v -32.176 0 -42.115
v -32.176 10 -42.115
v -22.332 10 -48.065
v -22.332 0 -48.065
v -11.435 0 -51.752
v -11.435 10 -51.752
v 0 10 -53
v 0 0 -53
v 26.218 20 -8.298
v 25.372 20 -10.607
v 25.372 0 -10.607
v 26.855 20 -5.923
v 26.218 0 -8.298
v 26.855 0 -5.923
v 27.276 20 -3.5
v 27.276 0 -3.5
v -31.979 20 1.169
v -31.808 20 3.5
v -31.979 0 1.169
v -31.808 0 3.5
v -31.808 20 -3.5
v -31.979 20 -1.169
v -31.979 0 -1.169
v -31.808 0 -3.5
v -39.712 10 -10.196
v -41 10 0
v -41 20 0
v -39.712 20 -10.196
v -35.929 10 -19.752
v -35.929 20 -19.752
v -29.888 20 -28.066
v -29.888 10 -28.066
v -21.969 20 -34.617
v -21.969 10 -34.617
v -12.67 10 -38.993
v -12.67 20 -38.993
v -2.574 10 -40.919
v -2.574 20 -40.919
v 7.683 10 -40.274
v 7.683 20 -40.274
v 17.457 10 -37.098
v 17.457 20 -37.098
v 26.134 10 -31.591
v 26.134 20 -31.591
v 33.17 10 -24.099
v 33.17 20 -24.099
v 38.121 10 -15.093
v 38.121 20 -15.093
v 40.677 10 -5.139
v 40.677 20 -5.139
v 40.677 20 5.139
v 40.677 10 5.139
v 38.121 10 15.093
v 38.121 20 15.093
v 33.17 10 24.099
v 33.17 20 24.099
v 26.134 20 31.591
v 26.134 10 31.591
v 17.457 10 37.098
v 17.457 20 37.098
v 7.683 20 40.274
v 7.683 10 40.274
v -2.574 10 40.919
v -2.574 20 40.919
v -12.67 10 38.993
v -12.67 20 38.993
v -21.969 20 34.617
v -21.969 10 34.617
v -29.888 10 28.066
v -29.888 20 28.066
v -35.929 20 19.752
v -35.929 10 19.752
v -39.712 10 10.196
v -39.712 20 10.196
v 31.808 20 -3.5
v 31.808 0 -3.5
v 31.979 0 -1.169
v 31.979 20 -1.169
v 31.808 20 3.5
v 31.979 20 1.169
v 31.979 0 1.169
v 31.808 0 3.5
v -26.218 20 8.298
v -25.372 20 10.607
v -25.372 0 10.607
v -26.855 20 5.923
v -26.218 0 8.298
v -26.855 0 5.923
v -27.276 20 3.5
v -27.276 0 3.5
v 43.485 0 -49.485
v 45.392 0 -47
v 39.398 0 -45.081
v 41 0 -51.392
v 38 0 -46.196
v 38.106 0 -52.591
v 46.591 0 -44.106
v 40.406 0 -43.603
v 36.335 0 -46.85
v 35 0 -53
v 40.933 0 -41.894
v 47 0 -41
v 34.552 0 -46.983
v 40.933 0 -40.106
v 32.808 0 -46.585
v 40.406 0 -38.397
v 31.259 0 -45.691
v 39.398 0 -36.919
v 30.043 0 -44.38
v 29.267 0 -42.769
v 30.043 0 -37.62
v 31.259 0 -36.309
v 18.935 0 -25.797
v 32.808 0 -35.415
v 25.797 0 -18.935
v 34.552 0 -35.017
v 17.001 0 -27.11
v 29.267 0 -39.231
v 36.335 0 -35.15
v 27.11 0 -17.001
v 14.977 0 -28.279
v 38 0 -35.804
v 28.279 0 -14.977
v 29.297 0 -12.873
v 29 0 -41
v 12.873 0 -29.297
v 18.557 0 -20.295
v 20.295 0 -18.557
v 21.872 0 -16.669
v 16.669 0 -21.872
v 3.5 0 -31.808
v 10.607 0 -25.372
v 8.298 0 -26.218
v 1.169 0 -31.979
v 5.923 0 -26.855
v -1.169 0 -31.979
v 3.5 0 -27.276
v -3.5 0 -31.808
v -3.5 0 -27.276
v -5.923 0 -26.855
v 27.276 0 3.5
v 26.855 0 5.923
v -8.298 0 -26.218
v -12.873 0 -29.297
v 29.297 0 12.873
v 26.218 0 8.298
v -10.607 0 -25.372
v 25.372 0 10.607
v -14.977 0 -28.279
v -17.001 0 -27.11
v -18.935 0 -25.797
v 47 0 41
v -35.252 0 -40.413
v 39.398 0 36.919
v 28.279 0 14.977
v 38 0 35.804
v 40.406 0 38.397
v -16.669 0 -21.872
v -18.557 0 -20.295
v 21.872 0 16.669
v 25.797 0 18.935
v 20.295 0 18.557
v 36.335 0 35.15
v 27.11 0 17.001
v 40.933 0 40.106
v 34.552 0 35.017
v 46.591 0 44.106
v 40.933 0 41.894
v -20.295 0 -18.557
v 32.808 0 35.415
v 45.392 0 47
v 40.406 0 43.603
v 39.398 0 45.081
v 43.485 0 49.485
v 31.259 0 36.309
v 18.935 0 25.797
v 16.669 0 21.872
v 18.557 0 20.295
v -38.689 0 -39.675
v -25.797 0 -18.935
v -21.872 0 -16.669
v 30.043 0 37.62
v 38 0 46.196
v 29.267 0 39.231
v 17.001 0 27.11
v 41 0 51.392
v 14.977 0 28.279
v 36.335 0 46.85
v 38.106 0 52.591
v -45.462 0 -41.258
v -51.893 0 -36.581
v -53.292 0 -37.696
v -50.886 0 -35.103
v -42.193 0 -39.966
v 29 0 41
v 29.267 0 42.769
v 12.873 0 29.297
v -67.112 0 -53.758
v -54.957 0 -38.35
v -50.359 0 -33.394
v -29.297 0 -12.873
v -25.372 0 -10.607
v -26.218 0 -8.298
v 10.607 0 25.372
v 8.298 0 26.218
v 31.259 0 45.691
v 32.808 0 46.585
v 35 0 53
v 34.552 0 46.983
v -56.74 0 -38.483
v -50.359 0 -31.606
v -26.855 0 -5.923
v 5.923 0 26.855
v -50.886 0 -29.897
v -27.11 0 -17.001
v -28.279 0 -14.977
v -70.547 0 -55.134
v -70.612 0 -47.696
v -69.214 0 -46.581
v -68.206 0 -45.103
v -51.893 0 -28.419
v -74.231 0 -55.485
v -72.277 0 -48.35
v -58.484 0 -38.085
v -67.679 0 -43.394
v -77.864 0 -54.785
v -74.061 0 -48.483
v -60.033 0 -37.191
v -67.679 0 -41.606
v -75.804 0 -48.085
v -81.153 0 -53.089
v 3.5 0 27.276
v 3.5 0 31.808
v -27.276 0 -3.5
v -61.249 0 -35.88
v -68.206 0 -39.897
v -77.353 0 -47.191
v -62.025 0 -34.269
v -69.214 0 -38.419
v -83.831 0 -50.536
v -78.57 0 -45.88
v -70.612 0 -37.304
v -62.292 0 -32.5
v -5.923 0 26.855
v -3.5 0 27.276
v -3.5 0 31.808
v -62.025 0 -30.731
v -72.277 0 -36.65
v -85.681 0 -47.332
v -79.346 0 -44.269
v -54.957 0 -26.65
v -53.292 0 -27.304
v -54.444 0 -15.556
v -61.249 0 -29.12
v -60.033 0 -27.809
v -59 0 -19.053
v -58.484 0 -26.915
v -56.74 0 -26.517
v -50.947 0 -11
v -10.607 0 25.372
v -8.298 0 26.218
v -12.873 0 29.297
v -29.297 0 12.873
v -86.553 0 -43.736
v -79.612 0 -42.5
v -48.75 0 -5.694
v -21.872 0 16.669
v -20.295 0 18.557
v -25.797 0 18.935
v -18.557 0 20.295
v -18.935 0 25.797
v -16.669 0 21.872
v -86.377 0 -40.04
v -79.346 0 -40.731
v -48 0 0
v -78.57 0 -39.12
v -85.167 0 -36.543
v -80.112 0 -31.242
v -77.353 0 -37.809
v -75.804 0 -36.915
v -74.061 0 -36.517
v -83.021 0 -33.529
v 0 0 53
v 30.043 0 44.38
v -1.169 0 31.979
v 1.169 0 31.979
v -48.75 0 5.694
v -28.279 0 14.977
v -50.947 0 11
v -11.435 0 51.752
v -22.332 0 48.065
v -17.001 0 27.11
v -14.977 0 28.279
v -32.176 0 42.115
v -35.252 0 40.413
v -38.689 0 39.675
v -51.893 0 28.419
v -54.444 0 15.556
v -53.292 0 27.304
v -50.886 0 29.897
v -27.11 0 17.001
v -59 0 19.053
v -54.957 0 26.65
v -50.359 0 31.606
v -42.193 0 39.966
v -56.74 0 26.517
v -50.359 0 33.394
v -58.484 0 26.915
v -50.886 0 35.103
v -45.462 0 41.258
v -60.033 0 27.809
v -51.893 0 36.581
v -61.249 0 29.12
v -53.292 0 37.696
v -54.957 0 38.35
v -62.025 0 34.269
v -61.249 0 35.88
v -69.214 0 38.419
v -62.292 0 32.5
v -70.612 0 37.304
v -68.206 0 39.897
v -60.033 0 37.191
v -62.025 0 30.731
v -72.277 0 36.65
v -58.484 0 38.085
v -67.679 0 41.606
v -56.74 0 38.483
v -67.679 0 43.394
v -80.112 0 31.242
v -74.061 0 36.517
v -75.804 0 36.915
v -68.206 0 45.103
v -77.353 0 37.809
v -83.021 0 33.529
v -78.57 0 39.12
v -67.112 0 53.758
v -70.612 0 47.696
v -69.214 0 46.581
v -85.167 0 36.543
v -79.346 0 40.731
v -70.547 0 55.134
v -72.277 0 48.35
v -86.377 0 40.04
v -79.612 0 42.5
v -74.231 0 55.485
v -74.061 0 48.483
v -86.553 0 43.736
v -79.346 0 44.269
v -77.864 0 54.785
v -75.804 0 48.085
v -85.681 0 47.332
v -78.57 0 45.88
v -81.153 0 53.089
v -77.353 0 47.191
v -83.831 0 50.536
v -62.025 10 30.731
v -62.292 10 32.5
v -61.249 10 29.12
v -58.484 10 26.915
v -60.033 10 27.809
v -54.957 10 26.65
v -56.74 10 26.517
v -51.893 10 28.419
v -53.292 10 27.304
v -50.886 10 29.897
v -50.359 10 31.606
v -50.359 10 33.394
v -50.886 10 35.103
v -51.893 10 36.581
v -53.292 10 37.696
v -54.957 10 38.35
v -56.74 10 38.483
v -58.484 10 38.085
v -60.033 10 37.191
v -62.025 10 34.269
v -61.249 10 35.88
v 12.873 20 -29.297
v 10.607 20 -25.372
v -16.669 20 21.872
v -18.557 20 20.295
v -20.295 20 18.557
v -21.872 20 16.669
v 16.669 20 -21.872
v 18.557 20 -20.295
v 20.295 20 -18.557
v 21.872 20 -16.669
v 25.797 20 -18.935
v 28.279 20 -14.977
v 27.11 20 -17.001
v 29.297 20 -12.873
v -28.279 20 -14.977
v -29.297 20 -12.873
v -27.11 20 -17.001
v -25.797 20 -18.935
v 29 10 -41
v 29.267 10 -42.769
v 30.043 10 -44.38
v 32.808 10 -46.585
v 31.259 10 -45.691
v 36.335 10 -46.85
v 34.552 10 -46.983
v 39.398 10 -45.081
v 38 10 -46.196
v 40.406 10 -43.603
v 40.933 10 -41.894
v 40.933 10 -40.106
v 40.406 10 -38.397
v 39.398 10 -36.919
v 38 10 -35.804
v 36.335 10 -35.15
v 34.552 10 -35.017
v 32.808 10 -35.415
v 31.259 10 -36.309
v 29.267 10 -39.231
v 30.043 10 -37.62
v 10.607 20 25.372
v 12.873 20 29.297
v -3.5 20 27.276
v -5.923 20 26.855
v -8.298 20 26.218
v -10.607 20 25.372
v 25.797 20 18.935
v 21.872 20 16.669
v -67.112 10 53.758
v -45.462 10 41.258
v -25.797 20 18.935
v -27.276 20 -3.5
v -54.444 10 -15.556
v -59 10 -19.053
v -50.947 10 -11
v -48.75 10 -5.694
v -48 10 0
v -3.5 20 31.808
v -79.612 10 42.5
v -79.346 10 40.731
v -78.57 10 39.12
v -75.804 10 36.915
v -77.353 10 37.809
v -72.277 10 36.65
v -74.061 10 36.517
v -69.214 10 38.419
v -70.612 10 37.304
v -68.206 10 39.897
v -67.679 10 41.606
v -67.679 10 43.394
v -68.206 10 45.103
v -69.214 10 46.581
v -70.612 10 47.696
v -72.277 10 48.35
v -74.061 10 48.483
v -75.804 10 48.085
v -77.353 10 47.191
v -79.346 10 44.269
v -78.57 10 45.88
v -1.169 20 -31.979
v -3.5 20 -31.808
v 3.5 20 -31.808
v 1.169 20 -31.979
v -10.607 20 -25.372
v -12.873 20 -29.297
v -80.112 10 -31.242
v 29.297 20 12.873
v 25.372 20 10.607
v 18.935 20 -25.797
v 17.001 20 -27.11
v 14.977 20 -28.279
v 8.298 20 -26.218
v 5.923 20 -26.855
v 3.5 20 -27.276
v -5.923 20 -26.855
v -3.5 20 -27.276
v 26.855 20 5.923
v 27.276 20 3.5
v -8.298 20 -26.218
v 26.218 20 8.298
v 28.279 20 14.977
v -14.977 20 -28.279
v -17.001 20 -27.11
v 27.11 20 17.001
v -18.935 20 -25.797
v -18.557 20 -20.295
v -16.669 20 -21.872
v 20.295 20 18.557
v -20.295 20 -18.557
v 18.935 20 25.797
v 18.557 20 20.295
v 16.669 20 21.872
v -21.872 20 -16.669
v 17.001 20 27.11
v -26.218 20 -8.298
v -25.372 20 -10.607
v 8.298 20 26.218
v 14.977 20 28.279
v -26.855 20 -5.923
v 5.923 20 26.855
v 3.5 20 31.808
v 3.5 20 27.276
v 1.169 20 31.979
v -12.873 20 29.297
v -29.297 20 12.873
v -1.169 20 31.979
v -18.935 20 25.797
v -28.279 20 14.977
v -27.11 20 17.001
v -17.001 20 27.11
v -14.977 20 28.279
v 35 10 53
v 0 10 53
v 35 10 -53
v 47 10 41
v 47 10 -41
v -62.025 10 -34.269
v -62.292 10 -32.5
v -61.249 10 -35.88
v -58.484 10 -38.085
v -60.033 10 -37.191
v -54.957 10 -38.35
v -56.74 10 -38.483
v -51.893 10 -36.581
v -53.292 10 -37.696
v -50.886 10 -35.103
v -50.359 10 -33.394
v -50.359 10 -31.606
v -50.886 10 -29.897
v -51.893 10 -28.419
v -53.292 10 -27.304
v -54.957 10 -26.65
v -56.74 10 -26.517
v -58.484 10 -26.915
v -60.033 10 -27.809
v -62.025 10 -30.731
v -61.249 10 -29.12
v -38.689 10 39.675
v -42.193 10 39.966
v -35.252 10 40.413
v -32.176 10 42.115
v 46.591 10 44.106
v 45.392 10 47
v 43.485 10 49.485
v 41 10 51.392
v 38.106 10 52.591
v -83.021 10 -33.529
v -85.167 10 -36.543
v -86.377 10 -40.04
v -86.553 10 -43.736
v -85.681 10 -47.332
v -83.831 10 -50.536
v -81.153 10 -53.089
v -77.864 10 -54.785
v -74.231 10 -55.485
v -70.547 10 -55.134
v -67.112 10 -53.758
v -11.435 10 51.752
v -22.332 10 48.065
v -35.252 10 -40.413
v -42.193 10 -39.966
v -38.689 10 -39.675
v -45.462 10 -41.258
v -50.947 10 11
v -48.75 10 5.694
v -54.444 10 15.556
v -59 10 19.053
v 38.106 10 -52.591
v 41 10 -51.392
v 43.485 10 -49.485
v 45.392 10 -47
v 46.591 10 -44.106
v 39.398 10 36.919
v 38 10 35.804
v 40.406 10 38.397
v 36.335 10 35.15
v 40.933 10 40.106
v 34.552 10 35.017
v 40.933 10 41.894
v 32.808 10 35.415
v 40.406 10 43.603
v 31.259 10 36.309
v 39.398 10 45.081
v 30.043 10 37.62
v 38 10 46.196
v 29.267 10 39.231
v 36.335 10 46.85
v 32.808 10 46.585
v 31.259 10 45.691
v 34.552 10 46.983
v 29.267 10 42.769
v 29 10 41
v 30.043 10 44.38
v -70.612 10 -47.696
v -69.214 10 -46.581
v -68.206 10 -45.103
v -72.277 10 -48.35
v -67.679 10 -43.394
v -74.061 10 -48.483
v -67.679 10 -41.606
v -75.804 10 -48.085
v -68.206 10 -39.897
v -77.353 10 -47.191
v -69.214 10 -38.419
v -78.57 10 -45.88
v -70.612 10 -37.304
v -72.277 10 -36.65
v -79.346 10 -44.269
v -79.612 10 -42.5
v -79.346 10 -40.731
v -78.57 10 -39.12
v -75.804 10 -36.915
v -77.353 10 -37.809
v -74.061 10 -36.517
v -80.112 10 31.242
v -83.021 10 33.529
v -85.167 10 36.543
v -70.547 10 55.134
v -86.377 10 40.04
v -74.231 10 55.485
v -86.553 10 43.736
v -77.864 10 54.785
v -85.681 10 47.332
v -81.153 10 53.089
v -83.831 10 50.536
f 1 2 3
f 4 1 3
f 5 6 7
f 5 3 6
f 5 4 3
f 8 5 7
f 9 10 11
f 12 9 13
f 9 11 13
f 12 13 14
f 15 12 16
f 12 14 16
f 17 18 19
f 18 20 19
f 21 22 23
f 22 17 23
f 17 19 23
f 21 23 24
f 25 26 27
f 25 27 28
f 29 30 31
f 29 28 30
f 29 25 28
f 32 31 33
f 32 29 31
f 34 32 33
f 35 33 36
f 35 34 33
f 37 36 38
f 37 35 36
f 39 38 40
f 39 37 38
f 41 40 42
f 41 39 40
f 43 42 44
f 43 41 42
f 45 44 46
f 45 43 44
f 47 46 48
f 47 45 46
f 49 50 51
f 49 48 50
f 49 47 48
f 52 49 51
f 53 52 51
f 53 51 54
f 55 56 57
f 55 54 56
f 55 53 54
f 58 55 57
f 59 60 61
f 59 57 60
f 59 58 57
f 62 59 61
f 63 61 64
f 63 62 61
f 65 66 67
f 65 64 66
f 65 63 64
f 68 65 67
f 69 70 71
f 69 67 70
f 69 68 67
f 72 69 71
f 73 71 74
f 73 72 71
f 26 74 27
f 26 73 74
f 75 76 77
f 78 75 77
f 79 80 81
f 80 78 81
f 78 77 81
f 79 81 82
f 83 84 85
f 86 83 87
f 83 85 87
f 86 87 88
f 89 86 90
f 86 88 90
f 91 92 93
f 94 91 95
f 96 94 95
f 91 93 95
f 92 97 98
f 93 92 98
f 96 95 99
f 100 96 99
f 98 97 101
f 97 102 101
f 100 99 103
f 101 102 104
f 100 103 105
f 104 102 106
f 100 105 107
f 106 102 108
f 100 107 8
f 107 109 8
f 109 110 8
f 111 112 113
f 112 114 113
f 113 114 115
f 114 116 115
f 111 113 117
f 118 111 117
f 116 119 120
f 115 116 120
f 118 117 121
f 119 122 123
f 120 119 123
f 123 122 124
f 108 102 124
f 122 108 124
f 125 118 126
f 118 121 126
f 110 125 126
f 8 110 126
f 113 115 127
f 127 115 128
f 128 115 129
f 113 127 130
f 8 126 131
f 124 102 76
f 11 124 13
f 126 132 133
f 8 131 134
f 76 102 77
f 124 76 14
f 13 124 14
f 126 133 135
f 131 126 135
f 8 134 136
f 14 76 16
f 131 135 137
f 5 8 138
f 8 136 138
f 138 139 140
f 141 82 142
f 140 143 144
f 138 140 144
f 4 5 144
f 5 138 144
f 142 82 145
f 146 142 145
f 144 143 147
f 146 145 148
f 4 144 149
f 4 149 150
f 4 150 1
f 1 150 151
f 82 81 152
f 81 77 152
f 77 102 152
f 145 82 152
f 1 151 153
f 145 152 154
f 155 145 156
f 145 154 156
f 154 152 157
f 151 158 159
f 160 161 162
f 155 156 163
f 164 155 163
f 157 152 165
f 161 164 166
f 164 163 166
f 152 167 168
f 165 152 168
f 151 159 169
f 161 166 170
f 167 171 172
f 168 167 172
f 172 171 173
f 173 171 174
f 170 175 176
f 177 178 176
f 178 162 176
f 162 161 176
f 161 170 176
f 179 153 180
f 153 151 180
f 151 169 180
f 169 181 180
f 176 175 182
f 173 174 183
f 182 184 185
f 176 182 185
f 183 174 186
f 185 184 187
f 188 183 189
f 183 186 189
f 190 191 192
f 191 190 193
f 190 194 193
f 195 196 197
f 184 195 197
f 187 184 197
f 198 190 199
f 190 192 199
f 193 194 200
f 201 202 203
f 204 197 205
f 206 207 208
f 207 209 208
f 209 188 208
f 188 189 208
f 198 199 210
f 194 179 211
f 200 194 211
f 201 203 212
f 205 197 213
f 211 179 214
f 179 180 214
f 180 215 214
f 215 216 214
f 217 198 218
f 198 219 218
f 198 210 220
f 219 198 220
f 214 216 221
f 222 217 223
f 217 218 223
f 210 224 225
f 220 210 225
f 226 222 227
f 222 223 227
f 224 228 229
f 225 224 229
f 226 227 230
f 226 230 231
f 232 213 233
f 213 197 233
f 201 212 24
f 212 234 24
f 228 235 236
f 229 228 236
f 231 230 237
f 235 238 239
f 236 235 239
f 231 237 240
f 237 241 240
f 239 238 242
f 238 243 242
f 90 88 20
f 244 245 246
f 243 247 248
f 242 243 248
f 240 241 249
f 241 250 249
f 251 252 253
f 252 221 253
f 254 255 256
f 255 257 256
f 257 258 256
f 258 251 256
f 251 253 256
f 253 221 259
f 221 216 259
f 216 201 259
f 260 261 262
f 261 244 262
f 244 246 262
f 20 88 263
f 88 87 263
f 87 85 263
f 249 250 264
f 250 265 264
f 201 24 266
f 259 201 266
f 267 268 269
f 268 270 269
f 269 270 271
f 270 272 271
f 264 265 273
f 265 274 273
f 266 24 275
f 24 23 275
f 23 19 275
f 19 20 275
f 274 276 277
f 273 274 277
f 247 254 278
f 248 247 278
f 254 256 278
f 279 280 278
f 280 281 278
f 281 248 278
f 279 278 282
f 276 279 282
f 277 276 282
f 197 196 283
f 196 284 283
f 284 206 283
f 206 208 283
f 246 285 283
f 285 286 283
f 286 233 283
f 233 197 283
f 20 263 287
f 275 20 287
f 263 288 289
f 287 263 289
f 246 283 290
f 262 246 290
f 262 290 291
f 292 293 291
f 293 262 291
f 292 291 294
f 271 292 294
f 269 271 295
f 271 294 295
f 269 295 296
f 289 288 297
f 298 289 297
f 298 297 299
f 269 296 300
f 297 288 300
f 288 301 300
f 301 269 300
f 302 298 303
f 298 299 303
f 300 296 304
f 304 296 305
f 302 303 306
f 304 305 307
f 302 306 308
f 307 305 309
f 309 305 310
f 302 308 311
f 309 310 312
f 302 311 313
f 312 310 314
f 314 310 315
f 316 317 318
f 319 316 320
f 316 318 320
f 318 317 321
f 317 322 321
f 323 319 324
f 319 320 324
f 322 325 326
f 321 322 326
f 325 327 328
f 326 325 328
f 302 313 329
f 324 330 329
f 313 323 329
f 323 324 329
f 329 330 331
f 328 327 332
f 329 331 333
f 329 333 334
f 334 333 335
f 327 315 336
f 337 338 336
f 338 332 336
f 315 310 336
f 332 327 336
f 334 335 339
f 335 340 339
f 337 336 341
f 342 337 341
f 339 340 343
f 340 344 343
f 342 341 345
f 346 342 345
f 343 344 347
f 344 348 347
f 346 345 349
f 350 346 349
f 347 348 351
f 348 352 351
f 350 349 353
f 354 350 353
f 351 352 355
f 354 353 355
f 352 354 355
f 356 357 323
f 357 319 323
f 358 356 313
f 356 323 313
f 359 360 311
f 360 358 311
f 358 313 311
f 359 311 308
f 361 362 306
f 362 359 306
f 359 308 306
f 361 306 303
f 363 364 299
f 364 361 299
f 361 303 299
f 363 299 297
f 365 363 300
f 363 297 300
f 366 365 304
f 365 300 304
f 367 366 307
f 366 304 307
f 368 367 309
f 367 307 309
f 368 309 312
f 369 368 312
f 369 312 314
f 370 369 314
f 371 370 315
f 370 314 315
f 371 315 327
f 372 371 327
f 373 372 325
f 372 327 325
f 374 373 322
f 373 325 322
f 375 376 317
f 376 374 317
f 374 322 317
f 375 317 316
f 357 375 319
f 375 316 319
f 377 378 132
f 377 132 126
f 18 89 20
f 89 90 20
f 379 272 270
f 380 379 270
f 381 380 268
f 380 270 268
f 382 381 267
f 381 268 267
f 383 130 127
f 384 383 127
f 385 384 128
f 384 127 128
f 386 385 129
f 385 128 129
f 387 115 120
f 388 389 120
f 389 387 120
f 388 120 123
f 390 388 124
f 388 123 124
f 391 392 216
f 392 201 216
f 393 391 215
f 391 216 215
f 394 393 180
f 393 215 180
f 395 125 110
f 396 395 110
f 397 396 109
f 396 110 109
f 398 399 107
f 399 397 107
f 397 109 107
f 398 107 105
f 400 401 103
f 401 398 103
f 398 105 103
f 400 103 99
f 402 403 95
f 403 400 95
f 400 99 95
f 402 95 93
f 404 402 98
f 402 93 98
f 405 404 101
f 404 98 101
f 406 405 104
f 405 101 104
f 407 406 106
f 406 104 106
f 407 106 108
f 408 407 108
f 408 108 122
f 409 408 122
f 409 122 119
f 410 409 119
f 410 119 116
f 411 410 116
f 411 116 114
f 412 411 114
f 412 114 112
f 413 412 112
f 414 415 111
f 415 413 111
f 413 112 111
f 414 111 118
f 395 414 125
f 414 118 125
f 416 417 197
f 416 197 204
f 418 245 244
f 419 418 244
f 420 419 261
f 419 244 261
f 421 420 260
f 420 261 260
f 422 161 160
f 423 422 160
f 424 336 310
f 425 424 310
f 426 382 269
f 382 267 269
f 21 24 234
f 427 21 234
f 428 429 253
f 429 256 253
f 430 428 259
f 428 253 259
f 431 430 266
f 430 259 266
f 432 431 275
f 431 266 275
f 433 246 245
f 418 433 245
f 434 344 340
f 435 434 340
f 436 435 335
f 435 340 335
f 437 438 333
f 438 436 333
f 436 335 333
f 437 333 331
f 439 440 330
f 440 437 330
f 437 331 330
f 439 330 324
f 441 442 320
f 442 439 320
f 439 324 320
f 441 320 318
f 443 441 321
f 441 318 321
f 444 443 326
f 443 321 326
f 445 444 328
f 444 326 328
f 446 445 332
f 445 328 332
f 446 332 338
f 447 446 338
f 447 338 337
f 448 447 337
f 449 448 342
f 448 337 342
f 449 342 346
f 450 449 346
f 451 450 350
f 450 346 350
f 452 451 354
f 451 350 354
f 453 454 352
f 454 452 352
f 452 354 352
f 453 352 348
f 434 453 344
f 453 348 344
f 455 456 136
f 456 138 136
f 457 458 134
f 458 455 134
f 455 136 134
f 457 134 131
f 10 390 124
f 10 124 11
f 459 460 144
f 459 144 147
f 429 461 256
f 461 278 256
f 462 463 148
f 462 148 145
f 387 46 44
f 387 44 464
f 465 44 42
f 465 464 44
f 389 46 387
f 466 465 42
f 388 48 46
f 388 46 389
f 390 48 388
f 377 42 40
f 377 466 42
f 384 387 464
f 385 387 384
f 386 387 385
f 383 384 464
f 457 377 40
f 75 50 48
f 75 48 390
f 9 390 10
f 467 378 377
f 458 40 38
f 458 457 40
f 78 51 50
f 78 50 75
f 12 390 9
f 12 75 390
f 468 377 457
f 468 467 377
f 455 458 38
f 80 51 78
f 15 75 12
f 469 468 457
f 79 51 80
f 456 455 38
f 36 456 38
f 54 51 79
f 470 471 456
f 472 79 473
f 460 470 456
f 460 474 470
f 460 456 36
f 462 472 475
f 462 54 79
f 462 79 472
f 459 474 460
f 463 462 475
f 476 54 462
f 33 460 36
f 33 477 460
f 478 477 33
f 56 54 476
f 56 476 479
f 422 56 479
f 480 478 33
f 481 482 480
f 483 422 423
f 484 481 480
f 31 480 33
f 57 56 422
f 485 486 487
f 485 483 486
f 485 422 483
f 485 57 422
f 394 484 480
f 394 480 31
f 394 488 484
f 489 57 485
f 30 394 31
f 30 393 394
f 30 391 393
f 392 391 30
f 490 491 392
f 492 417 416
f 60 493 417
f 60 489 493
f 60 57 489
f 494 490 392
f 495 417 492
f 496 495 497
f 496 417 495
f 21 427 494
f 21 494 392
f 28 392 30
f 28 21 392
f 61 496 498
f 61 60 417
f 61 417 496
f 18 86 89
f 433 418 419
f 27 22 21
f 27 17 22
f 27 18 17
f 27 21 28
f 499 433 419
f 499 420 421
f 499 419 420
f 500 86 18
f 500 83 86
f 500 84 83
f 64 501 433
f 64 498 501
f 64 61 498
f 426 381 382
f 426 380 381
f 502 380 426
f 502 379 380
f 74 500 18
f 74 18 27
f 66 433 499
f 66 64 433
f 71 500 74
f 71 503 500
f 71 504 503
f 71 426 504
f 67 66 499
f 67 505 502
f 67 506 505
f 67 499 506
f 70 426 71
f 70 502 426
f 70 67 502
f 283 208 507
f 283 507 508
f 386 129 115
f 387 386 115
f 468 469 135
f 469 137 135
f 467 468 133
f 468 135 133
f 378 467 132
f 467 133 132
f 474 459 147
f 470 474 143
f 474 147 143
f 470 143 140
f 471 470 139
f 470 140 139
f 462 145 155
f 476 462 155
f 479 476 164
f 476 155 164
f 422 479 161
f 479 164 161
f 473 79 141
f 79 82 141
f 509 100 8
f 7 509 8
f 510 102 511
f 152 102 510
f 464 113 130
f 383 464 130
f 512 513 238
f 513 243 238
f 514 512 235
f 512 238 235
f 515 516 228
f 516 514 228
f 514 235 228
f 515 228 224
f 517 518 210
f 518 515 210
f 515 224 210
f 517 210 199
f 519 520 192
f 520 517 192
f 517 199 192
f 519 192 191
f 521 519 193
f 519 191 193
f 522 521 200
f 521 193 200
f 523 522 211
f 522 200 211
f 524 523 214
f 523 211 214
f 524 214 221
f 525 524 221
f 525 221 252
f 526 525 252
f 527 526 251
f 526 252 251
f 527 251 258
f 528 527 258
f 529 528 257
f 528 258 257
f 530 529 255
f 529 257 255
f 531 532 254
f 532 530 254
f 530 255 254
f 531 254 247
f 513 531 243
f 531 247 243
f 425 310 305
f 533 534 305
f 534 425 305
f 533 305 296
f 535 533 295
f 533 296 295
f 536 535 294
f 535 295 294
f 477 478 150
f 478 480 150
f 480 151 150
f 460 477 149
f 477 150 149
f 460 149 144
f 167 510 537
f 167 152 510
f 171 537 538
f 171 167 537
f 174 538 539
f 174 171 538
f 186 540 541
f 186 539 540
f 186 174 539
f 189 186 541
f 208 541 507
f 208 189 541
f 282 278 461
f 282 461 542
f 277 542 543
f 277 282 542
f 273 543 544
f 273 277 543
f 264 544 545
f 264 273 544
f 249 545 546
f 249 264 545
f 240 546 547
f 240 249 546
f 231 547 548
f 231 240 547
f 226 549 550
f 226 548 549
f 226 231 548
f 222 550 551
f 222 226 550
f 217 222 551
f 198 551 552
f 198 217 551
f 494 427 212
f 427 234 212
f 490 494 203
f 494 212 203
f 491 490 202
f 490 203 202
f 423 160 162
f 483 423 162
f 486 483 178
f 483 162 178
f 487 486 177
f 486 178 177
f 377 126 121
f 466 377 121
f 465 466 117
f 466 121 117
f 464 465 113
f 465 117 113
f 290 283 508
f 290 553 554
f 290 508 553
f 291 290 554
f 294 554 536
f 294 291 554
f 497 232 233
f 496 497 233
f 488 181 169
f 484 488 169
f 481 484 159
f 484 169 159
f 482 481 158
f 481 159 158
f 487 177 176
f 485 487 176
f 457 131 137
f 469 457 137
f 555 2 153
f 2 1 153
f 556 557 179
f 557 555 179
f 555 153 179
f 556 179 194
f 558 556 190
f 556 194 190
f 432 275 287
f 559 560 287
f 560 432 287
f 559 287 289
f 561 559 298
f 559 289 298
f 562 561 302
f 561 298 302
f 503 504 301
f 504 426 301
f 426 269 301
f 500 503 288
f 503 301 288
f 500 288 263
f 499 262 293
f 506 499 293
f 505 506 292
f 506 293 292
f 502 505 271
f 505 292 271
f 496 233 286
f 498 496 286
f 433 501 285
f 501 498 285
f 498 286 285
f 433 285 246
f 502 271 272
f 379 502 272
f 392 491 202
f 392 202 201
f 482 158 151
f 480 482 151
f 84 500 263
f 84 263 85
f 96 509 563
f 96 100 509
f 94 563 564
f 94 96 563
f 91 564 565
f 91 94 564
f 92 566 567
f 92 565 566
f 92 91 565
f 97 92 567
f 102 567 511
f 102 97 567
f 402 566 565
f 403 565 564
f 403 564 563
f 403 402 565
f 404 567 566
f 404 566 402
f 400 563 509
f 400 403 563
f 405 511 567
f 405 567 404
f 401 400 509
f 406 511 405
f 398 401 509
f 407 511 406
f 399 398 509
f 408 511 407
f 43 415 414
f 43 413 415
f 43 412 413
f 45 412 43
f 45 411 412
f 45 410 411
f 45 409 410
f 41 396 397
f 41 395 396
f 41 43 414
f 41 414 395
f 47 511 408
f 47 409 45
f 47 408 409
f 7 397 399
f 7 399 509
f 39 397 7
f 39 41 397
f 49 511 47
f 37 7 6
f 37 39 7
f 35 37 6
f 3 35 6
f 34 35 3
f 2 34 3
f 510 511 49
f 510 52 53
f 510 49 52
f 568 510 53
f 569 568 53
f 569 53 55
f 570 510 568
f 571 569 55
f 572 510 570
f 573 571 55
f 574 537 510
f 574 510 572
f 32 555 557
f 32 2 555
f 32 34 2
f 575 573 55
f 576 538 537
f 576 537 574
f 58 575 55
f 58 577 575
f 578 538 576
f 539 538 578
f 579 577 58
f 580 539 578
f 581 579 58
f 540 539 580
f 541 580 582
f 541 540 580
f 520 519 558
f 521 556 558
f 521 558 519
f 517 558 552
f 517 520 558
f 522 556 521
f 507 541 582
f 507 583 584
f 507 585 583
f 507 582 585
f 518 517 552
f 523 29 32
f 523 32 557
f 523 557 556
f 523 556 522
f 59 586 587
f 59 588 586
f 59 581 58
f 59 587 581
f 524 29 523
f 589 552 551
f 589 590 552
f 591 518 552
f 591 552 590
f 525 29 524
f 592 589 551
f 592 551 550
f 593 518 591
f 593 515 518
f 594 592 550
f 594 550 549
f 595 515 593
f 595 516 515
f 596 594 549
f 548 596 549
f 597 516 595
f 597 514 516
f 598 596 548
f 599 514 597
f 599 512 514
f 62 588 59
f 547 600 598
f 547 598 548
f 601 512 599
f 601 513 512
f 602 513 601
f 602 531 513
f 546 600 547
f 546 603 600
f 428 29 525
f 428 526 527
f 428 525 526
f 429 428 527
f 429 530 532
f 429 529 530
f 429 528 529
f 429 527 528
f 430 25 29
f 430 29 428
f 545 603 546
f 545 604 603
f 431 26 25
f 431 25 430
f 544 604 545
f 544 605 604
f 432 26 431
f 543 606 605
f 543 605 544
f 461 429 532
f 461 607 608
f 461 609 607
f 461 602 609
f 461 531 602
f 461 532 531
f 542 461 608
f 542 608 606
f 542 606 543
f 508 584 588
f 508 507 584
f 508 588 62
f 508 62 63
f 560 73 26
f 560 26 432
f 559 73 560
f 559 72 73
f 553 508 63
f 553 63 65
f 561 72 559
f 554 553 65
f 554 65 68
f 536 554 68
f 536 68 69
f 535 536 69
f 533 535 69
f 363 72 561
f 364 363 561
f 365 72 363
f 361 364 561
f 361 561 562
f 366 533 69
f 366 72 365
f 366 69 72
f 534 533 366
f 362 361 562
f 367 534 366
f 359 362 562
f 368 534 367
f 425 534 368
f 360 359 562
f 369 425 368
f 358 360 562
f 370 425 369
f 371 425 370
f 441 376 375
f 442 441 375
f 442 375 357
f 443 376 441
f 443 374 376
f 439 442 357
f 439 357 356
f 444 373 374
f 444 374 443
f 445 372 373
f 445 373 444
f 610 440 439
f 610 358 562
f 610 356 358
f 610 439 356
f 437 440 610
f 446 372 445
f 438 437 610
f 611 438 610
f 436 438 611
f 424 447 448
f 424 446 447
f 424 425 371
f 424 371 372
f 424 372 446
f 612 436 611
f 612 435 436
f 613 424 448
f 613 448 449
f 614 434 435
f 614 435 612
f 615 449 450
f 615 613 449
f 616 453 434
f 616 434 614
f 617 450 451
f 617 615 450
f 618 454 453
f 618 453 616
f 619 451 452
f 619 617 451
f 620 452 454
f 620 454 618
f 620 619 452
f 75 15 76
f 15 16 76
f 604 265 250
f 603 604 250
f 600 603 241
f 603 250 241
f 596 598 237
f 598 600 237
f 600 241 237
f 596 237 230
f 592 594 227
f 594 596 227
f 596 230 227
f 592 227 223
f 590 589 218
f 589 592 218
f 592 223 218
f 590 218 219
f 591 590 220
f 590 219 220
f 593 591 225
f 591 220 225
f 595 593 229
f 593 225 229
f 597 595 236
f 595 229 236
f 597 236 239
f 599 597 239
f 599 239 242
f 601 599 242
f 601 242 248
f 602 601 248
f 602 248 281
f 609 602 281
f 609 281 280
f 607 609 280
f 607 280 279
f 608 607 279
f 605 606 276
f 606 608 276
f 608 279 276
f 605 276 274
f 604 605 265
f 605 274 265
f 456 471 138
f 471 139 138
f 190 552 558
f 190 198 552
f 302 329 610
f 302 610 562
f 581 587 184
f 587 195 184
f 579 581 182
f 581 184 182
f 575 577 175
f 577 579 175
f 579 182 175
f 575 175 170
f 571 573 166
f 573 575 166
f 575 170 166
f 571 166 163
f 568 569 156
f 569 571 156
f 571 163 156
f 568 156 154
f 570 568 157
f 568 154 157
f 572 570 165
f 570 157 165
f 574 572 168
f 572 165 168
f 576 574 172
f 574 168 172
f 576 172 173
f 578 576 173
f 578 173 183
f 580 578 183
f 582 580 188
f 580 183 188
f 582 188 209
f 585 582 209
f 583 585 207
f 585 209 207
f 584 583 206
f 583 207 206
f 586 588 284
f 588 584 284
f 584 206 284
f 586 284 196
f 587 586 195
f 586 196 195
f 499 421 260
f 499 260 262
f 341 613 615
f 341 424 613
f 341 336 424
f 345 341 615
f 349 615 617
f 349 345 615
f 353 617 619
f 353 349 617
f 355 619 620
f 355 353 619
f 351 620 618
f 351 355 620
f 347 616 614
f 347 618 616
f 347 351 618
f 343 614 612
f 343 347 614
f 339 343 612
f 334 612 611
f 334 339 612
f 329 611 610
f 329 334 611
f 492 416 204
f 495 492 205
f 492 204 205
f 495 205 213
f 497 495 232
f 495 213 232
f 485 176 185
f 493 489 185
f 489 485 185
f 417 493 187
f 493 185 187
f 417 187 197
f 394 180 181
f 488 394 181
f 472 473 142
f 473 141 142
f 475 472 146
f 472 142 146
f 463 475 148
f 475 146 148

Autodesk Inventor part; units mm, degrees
ref_plane "YZ Plane" through (0, 0, 0) normal (1, 0, 0) x (0, 1, 0)
ref_plane "XZ Plane" through (0, 0, 0) normal (0, 1, 0) x (-1, 0, 0)
ref_plane "XY Plane" through (0, 0, 0) normal (0, 0, 1) x (1, 0, 0)
sketch "Sketch1" plane through (0, 0, 0) normal (0, 1, 0) x (-1, 0, 0)
  circle A0 centre (0, 0) radius 41
  line L0 (-47, 0) -> (-47, 41)
  line L1 (-35, 53) -> (0, 53)
  circle A1 centre (-35, 41) radius 6
  arc A2 (-35, 53) -> (-47, 41) centre (-35, 41) ccw
  circle A3 centre (73.6122, 42.5) radius 6
  circle A4 centre (56.2917, 32.5) radius 6
  line L2 (0, 0) -> (41, 0) construction
  line L3 (0, 0) -> (35.507, 20.5) construction
  line L4 (35.507, 20.5) -> (56.2917, 32.5) construction
  line L5 (56.2917, 32.5) -> (73.6122, 42.5) construction
  arc A5 (80.1122, 31.2417) -> (67.1122, 53.7583) centre (73.6122, 42.5) ccw
  line L6 (67.1122, 53.7583) -> (45.4615, 41.2583)
  line L7 (80.1122, 31.2417) -> (59, 19.0526)
  arc A6 (59, 19.0526) -> (48, 0) centre (70, 0) ccw
  arc A7 (32.1763, 42.1151) -> (45.4615, 41.2583) centre (39.4615, 51.6506) ccw
  line L8 (41, 0) -> (48, 0) construction
  circle A8 centre (73.6122, -42.5) radius 6
  circle A9 centre (56.2917, -32.5) radius 6
  arc A10 (67.1122, -53.7583) -> (80.1122, -31.2417) centre (73.6122, -42.5) ccw
  line L9 (67.1122, -53.7583) -> (45.4615, -41.2583)
  line L10 (80.1122, -31.2417) -> (59, -19.0526)
  arc A11 (48, 0) -> (59, -19.0526) centre (70, 0) ccw
  arc A12 (45.4615, -41.2583) -> (32.1763, -42.1151) centre (39.4615, -51.6506) ccw
  arc A13 (3.5, 31.808) -> (-3.5, 31.808) centre (0, 0) ccw
  arc A14 (10.6071, 25.372) -> (3.5, 27.2764) centre (0, 0) ccw
  line L11 (3.5, 31.808) -> (3.5, 27.2764)
  arc A15 (-12.8729, 29.2966) -> (-18.9351, 25.7966) centre (0, 0) ccw
  line L12 (-12.8729, 29.2966) -> (-10.6071, 25.372)
  arc A16 (-25.7966, 18.9351) -> (-29.2966, 12.8729) centre (0, 0) ccw
  line L13 (-25.7966, 18.9351) -> (-21.872, 16.6693)
  arc A17 (-31.808, 3.5) -> (-31.808, -3.5) centre (0, 0) ccw
  line L14 (-31.808, 3.5) -> (-27.2764, 3.5)
  arc A18 (-29.2966, -12.8729) -> (-25.7966, -18.9351) centre (0, 0) ccw
  line L15 (-29.2966, -12.8729) -> (-25.372, -10.6071)
  arc A19 (-18.9351, -25.7966) -> (-12.8729, -29.2966) centre (0, 0) ccw
  line L16 (-18.9351, -25.7966) -> (-16.6693, -21.872)
  arc A20 (-3.5, -31.808) -> (3.5, -31.808) centre (0, 0) ccw
  line L17 (-3.5, -31.808) -> (-3.5, -27.2764)
  arc A21 (12.8729, -29.2966) -> (18.9351, -25.7966) centre (0, 0) ccw
  line L18 (12.8729, -29.2966) -> (10.6071, -25.372)
  arc A22 (25.7966, -18.9351) -> (29.2966, -12.8729) centre (0, 0) ccw
  line L19 (25.7966, -18.9351) -> (21.872, -16.6693)
  arc A23 (31.808, -3.5) -> (31.808, 3.5) centre (0, 0) ccw
  line L20 (31.808, -3.5) -> (27.2764, -3.5)
  arc A24 (29.2966, 12.8729) -> (25.7966, 18.9351) centre (0, 0) ccw
  line L21 (29.2966, 12.8729) -> (25.372, 10.6071)
  arc A25 (18.9351, 25.7966) -> (12.8729, 29.2966) centre (0, 0) ccw
  line L22 (18.9351, 25.7966) -> (16.6693, 21.872)
  line L23 (10.6071, 25.372) -> (12.8729, 29.2966)
  arc A26 (-3.5, 27.2764) -> (-10.6071, 25.372) centre (0, 0) ccw
  line L24 (-3.5, 27.2764) -> (-3.5, 31.808)
  arc A27 (-16.6693, 21.872) -> (-21.872, 16.6693) centre (0, 0) ccw
  line L25 (-16.6693, 21.872) -> (-18.9351, 25.7966)
  arc A28 (-25.372, 10.6071) -> (-27.2764, 3.5) centre (0, 0) ccw
  line L26 (-25.372, 10.6071) -> (-29.2966, 12.8729)
  arc A29 (-27.2764, -3.5) -> (-25.372, -10.6071) centre (0, 0) ccw
  line L27 (-27.2764, -3.5) -> (-31.808, -3.5)
  arc A30 (-21.872, -16.6693) -> (-16.6693, -21.872) centre (0, 0) ccw
  line L28 (-21.872, -16.6693) -> (-25.7966, -18.9351)
  arc A31 (-10.6071, -25.372) -> (-3.5, -27.2764) centre (0, 0) ccw
  line L29 (-10.6071, -25.372) -> (-12.8729, -29.2966)
  arc A32 (3.5, -27.2764) -> (10.6071, -25.372) centre (0, 0) ccw
  line L30 (3.5, -27.2764) -> (3.5, -31.808)
  arc A33 (16.6693, -21.872) -> (21.872, -16.6693) centre (0, 0) ccw
  line L31 (16.6693, -21.872) -> (18.9351, -25.7966)
  arc A34 (25.372, -10.6071) -> (27.2764, -3.5) centre (0, 0) ccw
  line L32 (25.372, -10.6071) -> (29.2966, -12.8729)
  arc A35 (27.2764, 3.5) -> (25.372, 10.6071) centre (0, 0) ccw
  line L33 (27.2764, 3.5) -> (31.808, 3.5)
  arc A36 (21.872, 16.6693) -> (16.6693, 21.872) centre (0, 0) ccw
  line L34 (21.872, 16.6693) -> (25.7966, 18.9351)
  line L35 (-47, 0) -> (-47, -41)
  line L36 (-35, -53) -> (0, -53)
  circle A37 centre (-35, -41) radius 6
  arc A38 (-47, -41) -> (-35, -53) centre (-35, -41) ccw
  arc A39 (32.1763, 42.1151) -> (0, 53) centre (0, 0) ccw
  arc A40 (0, -53) -> (32.1763, -42.1151) centre (0, 0) ccw
  point P0 (25.7966, 18.9351)
  point P1 (31.808, 3.5)
  point P2 (29.2966, -12.8729)
  point P3 (18.9351, -25.7966)
  point P4 (3.5, -31.808)
  point P5 (-12.8729, -29.2966)
  point P6 (-25.7966, -18.9351)
  point P7 (-31.808, -3.5)
  point P8 (-29.2966, 12.8729)
  point P9 (-3.5, 31.808)
  dimension "d0" = 82
  dimension "d1" = 12
  dimension "d2" = 12
  dimension "d3" = 35
  dimension "d4" = 41
  dimension "d7" = 30
  dimension "d8" = 24
  dimension "d9" = 20
  dimension "d10" = 13
  dimension "d11" = 22
  dimension "d12" = 12
  dimension "d14" = 64
  dimension "d15" = 55
  dimension "d16" = 7
  dimension "d19" = 360
  dimension "d23" = 360
  dimension "d25" = 53
extrude "Extrusion1" add sketch "Sketch1" along normal blind 10 contours L0 A2 L1 A39 A7 L6 A5 L7 A6 A11 L10 A10 L9 A12 A40 L36 A38 L35
extrude "Extrusion2" add sketch "Sketch1" along normal blind 20 contours A0
properties part number "Splined_Flange_Mount"
